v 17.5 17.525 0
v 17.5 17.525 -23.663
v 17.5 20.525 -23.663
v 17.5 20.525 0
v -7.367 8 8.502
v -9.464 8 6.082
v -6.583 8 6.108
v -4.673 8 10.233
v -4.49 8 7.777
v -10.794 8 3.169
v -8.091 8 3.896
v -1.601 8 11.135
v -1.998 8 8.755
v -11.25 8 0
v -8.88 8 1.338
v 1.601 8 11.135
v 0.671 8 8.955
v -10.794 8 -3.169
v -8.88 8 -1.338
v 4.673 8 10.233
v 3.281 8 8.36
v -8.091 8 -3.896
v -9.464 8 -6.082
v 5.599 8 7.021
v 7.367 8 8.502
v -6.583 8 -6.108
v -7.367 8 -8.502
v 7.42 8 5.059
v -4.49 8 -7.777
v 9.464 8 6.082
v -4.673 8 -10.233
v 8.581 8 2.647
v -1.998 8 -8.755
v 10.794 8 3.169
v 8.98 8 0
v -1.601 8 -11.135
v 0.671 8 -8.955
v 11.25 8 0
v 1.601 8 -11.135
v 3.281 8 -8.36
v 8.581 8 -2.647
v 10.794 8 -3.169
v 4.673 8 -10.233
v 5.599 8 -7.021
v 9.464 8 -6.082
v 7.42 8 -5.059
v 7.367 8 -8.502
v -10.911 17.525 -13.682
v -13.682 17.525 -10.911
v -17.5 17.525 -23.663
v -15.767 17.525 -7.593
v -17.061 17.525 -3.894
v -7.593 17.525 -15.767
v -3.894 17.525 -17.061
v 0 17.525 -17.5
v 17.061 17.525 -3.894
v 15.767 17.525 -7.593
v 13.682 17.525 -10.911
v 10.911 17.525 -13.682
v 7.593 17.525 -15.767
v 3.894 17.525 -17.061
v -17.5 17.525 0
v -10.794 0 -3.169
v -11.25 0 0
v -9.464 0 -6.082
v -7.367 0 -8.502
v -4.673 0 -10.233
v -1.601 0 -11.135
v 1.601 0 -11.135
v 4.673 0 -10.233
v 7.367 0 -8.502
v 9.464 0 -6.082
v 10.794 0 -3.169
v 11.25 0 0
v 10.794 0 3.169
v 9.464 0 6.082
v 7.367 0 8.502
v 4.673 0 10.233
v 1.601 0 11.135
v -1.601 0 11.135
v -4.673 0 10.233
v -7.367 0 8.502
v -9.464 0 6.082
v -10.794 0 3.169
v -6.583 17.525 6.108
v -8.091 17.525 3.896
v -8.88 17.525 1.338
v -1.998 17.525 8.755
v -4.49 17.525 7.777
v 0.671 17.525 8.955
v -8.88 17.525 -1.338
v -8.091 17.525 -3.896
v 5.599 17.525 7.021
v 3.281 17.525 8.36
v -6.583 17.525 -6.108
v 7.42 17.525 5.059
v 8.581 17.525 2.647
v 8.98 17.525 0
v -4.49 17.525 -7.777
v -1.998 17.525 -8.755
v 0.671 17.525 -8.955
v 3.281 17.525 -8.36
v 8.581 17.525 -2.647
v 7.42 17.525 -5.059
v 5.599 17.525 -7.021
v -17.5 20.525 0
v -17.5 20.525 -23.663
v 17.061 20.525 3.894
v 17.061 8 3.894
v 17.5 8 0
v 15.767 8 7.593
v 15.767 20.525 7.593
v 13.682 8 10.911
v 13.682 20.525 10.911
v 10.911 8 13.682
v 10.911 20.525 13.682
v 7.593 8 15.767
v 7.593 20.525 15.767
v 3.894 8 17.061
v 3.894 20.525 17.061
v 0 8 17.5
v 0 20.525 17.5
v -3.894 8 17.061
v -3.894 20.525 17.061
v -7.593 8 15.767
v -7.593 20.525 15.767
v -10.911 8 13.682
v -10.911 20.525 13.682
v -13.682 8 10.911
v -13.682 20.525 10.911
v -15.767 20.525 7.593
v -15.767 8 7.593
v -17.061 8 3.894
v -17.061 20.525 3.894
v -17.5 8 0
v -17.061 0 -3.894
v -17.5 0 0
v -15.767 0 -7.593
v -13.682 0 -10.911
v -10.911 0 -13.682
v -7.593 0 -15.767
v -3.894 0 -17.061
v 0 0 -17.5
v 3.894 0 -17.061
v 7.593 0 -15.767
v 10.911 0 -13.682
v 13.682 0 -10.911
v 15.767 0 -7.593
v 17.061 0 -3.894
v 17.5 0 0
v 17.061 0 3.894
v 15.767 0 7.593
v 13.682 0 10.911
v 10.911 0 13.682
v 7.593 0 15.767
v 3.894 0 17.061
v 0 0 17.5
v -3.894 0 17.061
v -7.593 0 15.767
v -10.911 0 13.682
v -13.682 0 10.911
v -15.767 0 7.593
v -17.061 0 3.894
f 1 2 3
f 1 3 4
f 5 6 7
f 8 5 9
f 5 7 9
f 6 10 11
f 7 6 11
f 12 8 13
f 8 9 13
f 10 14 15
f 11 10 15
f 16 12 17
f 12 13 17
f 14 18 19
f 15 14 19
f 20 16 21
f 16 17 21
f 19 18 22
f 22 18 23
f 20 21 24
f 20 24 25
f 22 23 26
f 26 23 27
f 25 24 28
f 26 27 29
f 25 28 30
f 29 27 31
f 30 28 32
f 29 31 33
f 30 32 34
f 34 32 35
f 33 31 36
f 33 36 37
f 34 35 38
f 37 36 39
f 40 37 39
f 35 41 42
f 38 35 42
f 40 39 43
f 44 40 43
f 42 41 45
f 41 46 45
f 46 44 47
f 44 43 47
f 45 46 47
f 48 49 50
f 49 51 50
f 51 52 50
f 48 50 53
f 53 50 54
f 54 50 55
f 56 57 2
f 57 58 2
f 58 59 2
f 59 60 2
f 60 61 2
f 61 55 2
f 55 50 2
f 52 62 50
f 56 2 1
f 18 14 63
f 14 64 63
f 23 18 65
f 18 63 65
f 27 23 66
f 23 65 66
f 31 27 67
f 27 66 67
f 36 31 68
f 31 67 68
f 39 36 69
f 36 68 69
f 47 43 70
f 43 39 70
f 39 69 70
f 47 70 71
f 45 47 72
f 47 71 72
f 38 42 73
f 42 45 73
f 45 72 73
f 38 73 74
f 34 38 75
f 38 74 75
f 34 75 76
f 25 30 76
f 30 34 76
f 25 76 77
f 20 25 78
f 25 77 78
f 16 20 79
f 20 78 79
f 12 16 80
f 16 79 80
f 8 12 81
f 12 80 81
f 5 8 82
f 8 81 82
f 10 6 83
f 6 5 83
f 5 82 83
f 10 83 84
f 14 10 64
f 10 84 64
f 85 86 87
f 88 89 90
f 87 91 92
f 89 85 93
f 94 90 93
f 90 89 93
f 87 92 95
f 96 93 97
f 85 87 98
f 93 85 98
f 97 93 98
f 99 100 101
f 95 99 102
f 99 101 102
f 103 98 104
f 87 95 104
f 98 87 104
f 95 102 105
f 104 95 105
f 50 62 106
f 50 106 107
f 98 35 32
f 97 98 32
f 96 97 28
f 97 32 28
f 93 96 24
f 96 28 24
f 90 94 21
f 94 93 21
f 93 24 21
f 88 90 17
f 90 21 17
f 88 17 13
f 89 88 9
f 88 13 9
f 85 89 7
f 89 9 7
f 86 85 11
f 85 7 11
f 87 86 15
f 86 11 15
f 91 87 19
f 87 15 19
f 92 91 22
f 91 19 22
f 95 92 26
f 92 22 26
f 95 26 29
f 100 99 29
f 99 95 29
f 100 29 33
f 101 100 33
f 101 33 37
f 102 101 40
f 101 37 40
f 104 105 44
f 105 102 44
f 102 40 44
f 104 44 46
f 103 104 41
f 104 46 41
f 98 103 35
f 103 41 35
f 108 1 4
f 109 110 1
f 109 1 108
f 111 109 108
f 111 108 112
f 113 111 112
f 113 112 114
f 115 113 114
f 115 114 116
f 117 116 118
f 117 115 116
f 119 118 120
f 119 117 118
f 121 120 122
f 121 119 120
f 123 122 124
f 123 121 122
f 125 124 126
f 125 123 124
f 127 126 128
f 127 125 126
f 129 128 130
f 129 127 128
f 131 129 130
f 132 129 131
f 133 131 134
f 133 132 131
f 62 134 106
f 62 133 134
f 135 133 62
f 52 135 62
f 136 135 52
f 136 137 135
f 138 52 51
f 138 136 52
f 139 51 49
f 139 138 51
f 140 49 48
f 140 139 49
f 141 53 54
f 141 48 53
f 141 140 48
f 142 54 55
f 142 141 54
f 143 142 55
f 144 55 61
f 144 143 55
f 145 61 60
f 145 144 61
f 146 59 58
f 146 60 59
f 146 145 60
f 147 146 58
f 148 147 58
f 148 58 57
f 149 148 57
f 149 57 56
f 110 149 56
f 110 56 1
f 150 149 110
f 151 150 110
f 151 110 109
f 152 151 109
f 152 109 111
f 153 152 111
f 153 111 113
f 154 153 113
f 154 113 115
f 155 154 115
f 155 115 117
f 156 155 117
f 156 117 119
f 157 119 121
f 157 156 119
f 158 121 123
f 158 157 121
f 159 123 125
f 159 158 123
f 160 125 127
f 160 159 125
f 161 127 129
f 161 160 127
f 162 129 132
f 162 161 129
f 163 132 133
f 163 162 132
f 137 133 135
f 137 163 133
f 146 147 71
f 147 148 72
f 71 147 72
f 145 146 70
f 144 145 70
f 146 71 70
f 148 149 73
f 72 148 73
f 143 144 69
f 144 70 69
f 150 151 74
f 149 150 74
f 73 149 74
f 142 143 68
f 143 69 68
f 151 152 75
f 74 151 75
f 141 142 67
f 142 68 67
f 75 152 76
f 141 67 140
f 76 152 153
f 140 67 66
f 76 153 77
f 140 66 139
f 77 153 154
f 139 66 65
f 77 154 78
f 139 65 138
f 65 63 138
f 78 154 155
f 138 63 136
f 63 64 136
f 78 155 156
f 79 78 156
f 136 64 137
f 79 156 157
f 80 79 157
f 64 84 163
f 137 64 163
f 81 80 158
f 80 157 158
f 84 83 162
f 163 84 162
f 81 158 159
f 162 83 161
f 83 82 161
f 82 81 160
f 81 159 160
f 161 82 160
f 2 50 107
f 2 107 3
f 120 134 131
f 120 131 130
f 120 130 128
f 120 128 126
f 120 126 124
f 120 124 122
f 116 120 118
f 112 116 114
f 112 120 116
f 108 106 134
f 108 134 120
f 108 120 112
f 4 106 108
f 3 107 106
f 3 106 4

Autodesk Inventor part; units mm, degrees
ref_plane "YZ Plane" through (0, 0, 0) normal (1, 0, 0) x (0, 1, 0)
ref_plane "XZ Plane" through (0, 0, 0) normal (0, 1, 0) x (-1, 0, 0)
ref_plane "XY Plane" through (0, 0, 0) normal (0, 0, 1) x (1, 0, 0)
sketch "Sketch1" plane through (0, 0, 0) normal (0, 1, 0) x (-1, 0, 0)
  circle A0 centre (0, 0) radius 11.25
  circle A1 centre (0, 0) radius 17.5
  dimension "d0" = 22.5
  dimension "d1" = 35
extrude "Extrusion1" add sketch "Sketch1" along normal blind 8
sketch "Sketch2" plane through (0, 8, 0) normal (0, 1, 0) x (1, 0, 0)
  circle A0 centre (0, 0) radius 17.5
  circle A1 centre (0, 0) radius 8.9803
extrude "Extrusion2" add sketch "Sketch2" along normal blind 9.525
sketch "Sketch3" plane through (0, 17.525, 0) normal (0, 1, 0) x (1, 0, 0)
  circle A0 centre (0, 0) radius 17.5 projected
  line L0 (-17.5, 0) -> (-17.5, 23.6629)
  line L1 (-17.5, 23.6629) -> (17.5, 23.6629)
  line L2 (17.5, 23.6629) -> (17.5, 0)
  arc A1 (-17.5, 0) -> (17.5, 0) centre (0, 0) ccw
extrude "Extrusion3" add sketch "Sketch3" along normal blind 3
properties part number "hubholder"
